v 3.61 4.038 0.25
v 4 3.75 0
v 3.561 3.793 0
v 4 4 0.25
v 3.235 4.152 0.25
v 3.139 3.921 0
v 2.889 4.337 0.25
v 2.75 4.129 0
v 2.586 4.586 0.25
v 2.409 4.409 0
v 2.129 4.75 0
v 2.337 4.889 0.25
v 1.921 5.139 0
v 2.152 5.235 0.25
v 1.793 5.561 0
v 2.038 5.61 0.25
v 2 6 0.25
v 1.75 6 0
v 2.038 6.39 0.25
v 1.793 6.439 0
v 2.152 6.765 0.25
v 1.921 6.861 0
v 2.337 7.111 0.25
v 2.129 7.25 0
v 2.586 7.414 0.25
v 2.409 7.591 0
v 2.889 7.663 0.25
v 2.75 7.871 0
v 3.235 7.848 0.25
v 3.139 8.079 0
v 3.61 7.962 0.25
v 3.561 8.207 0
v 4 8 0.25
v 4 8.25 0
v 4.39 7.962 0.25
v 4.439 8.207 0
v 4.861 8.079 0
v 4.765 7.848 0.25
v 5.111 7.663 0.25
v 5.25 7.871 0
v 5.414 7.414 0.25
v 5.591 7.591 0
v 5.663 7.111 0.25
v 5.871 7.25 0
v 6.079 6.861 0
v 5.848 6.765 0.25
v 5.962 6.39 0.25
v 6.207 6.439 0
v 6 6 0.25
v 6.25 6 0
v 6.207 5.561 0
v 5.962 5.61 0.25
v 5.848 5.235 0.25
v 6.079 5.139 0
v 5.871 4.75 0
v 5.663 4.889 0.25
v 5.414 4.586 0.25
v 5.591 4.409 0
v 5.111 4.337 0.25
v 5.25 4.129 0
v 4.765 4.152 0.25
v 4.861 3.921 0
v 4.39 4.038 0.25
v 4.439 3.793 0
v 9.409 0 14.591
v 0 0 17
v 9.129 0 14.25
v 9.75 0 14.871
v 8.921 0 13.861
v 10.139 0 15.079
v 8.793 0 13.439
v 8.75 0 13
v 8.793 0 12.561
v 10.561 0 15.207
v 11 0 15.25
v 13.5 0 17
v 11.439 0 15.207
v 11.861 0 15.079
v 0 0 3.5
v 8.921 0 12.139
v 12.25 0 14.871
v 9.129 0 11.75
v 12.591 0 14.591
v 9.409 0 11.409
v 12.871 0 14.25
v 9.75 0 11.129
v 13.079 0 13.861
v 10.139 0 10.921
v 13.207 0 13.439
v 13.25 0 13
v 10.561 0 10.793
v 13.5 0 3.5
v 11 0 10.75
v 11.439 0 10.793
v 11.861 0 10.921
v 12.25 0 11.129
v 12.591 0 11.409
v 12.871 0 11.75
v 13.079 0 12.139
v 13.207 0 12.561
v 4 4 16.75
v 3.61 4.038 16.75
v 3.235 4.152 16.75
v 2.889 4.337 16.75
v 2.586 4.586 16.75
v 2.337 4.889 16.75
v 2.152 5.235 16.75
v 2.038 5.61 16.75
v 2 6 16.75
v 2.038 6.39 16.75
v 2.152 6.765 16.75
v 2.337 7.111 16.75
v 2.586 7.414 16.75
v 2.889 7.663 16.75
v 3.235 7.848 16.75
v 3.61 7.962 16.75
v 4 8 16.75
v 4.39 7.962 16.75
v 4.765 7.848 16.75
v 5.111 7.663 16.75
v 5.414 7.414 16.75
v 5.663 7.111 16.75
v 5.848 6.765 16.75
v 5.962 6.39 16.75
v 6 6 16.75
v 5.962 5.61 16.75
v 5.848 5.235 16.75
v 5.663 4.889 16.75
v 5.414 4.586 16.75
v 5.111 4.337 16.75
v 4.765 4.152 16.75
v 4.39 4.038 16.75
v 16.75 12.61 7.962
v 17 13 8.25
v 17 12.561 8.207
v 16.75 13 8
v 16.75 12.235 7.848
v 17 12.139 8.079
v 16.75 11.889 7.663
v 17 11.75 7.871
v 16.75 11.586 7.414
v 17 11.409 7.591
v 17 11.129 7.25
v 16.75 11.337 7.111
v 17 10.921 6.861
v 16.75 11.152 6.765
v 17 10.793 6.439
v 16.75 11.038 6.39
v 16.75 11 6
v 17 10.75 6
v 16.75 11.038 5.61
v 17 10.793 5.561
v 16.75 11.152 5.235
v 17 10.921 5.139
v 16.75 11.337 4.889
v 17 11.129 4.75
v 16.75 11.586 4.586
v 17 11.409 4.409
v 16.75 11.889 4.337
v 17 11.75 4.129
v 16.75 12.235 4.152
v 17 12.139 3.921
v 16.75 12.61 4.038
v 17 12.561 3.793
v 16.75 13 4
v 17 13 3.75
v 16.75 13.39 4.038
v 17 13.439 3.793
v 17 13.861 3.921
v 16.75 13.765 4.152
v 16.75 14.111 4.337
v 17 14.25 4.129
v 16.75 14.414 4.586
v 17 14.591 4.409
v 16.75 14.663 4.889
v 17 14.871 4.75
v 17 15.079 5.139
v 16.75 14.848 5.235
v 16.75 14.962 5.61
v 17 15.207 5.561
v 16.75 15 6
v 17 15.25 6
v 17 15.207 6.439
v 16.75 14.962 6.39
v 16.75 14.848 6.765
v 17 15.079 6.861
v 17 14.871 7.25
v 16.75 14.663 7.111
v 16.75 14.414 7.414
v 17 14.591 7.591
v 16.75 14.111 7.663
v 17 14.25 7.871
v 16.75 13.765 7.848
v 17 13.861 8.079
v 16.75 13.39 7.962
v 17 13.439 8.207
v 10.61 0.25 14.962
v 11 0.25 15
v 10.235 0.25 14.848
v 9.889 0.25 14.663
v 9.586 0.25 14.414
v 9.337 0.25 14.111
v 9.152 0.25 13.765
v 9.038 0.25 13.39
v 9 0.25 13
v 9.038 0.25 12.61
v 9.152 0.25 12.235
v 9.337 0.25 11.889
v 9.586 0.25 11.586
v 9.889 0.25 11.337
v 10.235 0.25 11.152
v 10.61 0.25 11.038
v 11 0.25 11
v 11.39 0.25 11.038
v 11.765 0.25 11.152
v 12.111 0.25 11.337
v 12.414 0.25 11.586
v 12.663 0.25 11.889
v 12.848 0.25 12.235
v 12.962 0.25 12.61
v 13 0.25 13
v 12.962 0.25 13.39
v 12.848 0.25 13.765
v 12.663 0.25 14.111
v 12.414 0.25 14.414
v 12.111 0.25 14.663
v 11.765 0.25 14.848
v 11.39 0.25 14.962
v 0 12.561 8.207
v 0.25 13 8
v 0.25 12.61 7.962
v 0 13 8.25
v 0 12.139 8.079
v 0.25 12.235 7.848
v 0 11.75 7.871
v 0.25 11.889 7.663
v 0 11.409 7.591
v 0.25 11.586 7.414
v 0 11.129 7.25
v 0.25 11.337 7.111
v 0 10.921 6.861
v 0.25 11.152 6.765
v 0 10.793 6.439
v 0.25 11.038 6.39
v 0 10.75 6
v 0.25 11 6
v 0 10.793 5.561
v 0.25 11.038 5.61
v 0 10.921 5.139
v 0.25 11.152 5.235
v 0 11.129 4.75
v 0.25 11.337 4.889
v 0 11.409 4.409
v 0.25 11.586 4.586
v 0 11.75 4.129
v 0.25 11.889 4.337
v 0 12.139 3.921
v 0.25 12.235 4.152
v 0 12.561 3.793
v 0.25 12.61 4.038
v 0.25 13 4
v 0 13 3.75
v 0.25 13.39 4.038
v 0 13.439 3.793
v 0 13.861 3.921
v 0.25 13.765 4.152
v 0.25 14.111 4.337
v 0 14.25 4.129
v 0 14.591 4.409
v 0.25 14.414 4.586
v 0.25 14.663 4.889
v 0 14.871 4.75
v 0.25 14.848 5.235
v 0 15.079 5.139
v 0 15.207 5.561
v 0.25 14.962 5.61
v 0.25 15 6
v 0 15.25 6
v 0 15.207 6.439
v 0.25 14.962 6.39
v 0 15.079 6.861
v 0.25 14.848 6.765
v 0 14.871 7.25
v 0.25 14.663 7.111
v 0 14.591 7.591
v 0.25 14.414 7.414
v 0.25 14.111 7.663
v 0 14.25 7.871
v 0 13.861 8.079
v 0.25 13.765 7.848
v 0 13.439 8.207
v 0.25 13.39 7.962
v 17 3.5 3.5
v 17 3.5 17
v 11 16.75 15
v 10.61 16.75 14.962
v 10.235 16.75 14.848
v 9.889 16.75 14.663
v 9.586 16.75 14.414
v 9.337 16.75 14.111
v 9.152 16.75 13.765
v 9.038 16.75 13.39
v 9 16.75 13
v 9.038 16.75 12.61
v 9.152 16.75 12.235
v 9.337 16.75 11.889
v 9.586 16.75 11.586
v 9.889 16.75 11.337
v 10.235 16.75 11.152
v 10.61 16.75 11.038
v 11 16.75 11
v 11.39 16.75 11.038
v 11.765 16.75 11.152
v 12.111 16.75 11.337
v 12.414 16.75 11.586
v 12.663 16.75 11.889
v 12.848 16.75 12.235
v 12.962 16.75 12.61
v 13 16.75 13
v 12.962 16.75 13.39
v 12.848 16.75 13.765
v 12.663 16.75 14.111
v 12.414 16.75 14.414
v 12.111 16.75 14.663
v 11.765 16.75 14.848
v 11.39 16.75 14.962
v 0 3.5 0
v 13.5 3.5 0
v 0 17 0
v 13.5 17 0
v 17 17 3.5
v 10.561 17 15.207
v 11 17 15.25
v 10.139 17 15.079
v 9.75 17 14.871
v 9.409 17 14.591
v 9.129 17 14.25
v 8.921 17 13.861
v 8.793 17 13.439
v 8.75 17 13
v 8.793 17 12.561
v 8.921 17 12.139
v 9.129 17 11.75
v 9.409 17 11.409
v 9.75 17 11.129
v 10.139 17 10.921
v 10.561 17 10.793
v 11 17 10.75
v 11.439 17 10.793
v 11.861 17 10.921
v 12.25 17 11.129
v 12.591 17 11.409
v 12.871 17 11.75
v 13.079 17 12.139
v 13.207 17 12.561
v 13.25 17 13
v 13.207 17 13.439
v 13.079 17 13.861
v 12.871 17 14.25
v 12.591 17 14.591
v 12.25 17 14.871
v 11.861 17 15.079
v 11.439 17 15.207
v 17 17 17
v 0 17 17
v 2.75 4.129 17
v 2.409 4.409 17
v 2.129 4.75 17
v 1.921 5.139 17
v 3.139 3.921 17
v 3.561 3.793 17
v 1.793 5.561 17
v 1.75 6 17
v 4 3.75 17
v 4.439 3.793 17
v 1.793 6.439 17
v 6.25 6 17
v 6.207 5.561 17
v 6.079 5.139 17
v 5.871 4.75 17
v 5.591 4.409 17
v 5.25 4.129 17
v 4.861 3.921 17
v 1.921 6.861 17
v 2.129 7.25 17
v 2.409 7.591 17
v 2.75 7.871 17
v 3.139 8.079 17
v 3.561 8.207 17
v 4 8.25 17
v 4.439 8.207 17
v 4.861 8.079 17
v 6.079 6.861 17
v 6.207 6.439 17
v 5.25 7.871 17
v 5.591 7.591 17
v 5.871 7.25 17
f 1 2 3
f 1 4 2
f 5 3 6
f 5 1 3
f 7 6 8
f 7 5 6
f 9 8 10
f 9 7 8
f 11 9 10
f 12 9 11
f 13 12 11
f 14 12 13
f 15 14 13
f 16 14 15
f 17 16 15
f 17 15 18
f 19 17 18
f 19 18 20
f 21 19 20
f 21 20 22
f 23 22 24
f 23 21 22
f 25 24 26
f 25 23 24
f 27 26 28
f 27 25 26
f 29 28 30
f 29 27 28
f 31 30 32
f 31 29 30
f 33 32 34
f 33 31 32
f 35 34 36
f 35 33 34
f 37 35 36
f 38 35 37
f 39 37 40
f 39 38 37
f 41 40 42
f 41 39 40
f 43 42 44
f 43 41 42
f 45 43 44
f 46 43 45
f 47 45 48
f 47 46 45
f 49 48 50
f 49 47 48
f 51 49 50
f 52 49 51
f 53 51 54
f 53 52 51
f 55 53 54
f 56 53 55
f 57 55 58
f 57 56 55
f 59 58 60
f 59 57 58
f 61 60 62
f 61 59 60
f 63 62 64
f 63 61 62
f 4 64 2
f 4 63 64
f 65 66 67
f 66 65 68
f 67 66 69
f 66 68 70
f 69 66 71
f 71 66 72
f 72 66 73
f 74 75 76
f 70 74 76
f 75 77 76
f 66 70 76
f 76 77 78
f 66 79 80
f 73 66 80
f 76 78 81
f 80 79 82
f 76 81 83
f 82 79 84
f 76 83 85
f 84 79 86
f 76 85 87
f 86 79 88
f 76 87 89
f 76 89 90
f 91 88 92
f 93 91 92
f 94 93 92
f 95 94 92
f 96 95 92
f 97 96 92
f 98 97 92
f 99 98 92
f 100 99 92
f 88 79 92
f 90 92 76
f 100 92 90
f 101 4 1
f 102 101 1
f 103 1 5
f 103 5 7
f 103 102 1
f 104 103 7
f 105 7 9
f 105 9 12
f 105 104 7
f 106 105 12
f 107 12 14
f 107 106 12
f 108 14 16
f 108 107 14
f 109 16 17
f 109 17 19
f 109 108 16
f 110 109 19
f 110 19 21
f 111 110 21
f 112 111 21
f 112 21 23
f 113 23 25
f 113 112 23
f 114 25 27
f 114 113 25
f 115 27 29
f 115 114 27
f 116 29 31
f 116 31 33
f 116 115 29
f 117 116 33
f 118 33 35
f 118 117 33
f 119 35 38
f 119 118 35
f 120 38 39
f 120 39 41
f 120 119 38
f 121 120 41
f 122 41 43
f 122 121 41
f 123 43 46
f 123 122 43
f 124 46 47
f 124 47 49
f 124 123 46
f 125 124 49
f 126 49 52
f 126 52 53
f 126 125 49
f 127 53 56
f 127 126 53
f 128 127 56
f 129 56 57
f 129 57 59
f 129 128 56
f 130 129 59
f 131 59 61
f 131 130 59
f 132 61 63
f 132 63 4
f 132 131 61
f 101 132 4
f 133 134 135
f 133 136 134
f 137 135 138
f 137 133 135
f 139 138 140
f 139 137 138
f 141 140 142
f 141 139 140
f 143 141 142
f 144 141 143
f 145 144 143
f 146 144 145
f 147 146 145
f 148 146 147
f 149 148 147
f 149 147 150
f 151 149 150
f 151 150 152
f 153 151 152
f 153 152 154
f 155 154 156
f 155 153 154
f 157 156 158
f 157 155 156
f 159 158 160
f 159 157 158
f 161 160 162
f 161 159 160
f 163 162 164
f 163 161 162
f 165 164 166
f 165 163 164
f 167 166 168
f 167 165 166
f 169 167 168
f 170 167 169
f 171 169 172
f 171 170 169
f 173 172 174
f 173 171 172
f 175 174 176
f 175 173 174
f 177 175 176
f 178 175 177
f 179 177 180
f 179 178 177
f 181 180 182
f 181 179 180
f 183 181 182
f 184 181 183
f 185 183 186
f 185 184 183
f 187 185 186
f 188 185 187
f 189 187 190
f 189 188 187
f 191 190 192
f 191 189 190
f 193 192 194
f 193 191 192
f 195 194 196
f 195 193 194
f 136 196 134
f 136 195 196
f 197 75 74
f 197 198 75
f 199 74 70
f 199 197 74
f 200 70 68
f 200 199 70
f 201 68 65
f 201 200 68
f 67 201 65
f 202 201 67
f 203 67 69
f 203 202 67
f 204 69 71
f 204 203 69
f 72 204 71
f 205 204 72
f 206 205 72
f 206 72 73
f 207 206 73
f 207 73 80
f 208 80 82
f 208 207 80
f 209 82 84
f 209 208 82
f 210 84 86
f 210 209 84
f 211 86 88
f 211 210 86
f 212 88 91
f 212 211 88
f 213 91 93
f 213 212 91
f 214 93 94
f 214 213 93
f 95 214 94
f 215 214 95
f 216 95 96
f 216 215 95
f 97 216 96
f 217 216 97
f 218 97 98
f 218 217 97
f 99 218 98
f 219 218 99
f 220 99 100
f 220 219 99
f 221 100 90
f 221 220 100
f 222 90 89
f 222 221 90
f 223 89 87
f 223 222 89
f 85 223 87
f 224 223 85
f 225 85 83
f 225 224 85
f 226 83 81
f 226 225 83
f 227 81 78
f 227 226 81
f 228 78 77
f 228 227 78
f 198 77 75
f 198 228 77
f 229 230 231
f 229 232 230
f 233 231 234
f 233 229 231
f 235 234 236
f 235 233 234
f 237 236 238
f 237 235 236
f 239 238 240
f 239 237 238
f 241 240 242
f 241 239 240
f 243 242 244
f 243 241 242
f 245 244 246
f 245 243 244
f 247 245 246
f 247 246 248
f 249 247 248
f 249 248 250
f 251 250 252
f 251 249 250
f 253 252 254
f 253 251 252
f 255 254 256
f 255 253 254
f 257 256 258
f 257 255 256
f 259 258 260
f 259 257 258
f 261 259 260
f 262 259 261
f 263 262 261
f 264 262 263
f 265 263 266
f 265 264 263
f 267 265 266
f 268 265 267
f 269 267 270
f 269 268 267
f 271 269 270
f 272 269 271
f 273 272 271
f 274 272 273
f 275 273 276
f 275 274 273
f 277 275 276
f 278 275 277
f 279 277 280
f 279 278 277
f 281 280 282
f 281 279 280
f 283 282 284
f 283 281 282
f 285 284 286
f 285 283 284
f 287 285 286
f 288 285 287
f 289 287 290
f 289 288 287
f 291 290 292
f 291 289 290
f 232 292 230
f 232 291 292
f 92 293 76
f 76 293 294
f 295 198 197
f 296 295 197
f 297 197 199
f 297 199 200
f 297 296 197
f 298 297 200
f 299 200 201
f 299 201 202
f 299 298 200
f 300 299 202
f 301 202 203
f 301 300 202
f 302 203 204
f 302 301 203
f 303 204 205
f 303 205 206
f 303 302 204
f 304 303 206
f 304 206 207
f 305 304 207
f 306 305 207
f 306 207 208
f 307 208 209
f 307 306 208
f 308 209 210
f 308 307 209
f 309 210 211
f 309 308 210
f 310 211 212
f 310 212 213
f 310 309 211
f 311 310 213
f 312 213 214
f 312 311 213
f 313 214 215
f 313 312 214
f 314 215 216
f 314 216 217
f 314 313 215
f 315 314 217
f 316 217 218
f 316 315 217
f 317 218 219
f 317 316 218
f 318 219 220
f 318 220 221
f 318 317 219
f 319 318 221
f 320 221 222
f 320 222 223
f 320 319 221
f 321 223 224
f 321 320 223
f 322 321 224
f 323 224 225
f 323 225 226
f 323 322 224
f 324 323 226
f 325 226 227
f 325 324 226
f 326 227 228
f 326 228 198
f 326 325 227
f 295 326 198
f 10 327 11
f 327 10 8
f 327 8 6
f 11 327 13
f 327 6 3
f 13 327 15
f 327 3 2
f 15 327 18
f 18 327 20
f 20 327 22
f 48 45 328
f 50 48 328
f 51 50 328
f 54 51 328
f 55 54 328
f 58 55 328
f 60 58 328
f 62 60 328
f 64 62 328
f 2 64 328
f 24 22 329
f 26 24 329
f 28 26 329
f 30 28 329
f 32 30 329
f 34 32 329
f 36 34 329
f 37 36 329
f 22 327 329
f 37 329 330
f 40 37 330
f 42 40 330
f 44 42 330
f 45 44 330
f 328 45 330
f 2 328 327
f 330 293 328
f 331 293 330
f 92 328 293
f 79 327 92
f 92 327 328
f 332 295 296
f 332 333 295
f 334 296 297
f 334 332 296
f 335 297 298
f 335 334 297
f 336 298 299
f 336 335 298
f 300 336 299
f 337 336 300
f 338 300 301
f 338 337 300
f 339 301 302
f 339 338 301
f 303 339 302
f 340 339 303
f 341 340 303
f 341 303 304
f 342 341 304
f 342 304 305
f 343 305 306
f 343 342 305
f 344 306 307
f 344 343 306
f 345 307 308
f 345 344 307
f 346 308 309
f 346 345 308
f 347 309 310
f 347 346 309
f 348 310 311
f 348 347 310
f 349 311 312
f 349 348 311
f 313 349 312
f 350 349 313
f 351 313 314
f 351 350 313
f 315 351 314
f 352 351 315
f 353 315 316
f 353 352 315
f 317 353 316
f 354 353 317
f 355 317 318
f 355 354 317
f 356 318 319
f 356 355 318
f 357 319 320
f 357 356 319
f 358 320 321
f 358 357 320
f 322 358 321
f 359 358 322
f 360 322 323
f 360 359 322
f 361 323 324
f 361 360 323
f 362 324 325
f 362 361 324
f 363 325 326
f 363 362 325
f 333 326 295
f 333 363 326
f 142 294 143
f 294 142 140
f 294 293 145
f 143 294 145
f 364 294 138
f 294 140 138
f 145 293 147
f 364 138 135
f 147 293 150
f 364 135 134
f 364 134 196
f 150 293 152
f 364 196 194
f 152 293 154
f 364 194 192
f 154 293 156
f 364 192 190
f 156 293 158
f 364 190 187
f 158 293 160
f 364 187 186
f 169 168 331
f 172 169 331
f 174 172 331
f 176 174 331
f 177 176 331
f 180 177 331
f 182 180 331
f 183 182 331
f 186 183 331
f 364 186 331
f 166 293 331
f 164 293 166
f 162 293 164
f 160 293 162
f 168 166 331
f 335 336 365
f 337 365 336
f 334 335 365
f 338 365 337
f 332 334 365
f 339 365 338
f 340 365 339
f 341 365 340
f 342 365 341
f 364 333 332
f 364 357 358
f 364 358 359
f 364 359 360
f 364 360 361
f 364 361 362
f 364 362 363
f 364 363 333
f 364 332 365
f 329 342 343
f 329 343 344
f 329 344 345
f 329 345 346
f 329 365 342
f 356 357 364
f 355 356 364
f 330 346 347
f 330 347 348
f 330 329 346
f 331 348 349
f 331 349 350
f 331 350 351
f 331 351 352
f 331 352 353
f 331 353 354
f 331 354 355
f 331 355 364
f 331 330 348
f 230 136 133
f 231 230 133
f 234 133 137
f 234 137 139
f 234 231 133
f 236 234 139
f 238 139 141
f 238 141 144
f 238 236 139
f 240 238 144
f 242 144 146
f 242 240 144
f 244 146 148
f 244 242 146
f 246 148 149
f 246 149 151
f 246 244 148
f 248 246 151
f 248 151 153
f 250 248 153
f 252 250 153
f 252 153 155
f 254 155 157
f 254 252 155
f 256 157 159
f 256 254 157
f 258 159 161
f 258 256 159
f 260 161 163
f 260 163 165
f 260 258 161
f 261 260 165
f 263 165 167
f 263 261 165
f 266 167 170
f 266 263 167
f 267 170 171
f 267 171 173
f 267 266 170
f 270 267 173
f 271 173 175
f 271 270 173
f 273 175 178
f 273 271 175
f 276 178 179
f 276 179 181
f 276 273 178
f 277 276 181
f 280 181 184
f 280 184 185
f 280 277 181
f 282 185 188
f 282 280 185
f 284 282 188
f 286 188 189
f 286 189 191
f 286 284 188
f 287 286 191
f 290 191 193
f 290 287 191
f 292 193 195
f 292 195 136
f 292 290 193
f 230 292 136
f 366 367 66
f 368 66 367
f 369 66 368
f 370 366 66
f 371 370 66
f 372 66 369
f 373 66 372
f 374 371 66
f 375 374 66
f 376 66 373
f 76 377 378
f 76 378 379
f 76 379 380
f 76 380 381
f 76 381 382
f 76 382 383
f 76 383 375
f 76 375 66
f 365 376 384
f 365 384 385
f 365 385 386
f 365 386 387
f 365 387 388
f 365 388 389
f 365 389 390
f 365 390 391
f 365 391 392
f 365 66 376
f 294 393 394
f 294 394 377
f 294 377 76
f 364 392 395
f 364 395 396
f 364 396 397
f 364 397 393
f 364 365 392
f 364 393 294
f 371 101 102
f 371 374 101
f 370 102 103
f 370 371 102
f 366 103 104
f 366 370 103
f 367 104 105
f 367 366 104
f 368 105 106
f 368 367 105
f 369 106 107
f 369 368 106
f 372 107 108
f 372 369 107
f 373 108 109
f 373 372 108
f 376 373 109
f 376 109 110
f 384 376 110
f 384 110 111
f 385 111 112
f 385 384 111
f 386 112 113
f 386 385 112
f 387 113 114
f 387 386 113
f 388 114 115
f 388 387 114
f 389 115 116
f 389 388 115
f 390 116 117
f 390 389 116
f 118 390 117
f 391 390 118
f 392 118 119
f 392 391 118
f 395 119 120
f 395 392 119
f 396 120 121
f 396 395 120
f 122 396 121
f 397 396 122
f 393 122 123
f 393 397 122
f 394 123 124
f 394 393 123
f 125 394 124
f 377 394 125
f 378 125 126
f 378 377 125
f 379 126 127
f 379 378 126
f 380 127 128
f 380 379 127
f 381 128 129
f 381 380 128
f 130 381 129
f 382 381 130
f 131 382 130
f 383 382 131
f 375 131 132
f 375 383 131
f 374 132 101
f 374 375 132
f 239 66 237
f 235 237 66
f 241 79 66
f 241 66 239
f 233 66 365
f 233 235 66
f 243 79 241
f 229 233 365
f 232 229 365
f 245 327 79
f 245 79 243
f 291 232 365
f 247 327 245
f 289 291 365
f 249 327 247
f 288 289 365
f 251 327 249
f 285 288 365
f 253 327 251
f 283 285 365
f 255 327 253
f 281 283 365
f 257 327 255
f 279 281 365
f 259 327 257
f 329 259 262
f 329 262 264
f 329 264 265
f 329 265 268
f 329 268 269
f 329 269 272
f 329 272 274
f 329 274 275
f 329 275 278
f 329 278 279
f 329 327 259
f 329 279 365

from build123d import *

# Parameters (mm, degrees)
SKETCH_1_W      = 17
SKETCH_1_H      = 17
EXTRUDE_1_DEPTH = 17
CHAMFER_1_SIZE  = 3.5


with BuildPart() as part:
    # Эскиз1 → Бобышка-Вытянуть1 (new body)
    with BuildSketch(Plane.XY):
        with Locations((8.5, 8.5)):
            Rectangle(SKETCH_1_W, SKETCH_1_H)
    extrude(amount=EXTRUDE_1_DEPTH)

    # Эскиз2 → Отверстие обработанное метчиком M4x0.71 (revolve, cut)
    with BuildSketch(Plane(origin=(11, 17, 13), x_dir=(0, 0, 1), z_dir=(1, 0, 0))):
        Polygon((0, 0), (0, 17), (2.25, 17), (2, 16.75), (2, 0.25), (2.25, 0), align=None)
    revolve(axis=Axis((11, 23.35, 13), (0, -1, 0)), mode=Mode.SUBTRACT)

    # Эскиз2 at point 2 (carried to point 2, square into its face) → Отверстие обработанное метчиком M4x0.71 at 2 (revolve, cut)
    with BuildSketch(Plane(origin=(4, 6, 17), x_dir=(0, -1, 0), z_dir=(1, 0, 0))):
        Polygon((0, 0), (0, 17), (2.25, 17), (2, 16.75), (2, 0.25), (2.25, 0), align=None)
    revolve(axis=Axis((4, 6, 23.35), (0, 0, -1)), mode=Mode.SUBTRACT)

    # Эскиз2 at point 3 (carried to point 3, square into its face) → Отверстие обработанное метчиком M4x0.71 at 3 (revolve, cut)
    with BuildSketch(Plane(origin=(0, 13, 6), x_dir=(0, 0, 1), z_dir=(0, 1, 0))):
        Polygon((0, 0), (0, 17), (2.25, 17), (2, 16.75), (2, 0.25), (2.25, 0), align=None)
    revolve(axis=Axis((-6.35, 13, 6), (1, 0, 0)), mode=Mode.SUBTRACT)

    # Фаска1
    chamfer_1_edges = [part.edges().sort_by_distance(p)[0] for p in [
        (17, 8.5, 0),
        (8.5, 0, 0),
        (17, 0, 8.5),
    ]]
    chamfer(chamfer_1_edges, length=CHAMFER_1_SIZE)


solid = part.part
